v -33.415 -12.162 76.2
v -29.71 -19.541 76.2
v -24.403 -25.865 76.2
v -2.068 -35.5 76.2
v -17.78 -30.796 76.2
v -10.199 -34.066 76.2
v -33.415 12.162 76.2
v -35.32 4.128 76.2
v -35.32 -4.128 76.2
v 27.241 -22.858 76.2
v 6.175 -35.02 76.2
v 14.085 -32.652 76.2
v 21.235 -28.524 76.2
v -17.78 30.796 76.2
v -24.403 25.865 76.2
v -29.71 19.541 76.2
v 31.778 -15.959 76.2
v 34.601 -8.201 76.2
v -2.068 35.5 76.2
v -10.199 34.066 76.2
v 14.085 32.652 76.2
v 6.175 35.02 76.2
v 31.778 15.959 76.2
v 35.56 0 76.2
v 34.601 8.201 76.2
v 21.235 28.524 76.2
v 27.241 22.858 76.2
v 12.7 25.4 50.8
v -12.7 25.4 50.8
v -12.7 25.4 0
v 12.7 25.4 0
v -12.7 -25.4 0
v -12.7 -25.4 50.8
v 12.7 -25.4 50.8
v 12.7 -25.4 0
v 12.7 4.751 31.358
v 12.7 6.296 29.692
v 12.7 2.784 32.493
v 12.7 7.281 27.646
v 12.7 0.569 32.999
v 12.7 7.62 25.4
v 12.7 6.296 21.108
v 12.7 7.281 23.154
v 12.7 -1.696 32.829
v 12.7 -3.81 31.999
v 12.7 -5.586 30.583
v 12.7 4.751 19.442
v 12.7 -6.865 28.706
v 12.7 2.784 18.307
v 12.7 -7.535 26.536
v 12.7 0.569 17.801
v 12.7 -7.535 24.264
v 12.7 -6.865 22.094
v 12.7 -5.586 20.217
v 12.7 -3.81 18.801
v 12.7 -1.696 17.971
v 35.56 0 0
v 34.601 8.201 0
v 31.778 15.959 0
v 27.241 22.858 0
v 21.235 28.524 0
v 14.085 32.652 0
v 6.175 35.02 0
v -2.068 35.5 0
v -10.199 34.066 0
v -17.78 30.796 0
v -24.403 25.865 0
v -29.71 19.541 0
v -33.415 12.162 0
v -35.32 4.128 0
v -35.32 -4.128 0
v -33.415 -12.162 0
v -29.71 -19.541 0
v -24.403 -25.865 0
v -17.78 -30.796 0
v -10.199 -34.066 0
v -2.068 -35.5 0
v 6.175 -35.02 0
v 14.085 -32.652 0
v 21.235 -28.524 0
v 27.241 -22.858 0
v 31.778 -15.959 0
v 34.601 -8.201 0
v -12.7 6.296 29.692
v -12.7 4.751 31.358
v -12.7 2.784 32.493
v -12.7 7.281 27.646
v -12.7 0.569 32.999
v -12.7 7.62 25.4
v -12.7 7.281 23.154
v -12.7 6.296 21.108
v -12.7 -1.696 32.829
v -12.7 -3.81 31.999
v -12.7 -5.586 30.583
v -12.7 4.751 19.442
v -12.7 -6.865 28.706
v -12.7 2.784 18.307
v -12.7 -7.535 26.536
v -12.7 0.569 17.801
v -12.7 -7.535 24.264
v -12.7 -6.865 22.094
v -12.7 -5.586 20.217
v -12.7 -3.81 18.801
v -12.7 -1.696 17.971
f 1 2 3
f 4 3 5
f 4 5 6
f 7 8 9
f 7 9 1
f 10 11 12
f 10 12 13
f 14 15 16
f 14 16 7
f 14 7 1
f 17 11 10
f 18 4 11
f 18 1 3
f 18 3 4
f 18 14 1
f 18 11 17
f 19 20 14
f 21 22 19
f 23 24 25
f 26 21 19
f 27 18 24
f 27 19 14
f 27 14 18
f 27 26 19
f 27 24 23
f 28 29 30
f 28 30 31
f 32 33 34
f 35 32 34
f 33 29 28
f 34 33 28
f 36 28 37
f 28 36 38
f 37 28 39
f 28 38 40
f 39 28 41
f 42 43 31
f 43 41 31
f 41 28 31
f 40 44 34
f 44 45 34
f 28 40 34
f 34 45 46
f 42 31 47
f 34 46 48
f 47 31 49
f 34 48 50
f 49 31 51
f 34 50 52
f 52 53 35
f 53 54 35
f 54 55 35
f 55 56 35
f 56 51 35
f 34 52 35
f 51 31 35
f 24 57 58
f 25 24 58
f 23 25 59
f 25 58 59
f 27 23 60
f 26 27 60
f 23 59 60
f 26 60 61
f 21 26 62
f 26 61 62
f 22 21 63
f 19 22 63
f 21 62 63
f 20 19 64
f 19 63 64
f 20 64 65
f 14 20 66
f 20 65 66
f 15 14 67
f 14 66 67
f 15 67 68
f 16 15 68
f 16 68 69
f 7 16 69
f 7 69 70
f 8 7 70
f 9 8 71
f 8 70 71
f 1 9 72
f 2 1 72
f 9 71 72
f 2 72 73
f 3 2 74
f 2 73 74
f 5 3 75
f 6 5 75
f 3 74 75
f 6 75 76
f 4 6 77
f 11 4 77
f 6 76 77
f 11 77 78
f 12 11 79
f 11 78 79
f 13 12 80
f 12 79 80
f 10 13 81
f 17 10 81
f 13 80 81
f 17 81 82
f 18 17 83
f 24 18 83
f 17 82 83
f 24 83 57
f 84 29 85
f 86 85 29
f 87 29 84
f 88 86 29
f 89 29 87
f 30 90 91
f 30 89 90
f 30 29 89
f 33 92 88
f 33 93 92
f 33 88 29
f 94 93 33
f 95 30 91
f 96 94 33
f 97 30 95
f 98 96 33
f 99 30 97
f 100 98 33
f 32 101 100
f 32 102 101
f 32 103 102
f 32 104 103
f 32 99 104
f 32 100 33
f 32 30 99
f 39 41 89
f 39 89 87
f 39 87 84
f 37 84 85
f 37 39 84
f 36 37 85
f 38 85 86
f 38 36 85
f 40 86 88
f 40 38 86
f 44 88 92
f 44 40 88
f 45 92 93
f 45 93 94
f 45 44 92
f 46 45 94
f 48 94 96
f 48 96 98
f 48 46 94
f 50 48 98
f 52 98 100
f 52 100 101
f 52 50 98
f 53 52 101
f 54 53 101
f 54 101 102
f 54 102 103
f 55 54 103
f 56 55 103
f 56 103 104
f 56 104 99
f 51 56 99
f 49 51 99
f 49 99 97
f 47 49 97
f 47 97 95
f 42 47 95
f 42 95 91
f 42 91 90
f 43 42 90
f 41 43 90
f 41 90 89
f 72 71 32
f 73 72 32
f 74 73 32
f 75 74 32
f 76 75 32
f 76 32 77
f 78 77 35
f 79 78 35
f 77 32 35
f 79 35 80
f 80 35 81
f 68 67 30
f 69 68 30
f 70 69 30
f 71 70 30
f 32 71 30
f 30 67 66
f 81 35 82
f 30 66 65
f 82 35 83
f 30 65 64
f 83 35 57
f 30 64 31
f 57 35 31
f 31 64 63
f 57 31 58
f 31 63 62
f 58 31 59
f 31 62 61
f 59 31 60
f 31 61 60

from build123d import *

# Parameters (mm, degrees)
F0_R     = 35.56
F1_DEPTH = 76.2
F2_W     = 25.4
F2_H     = 50.8
F3_DEPTH = 50.8
F5_R     = 7.62
F6_DEPTH = 66.04


with BuildPart() as f1:
    # F0 (on Top) → F1 (new body)
    with BuildSketch(Plane.XY):
        Circle(F0_R)
    extrude(amount=F1_DEPTH)

    # F2 (on face) → F3 (cut)
    with BuildSketch(Plane(origin=(0, 0, 0), x_dir=(1, 0, 0), z_dir=(0, 0, -1))):
        Rectangle(F2_W, F2_H)
    extrude(amount=-F3_DEPTH, mode=Mode.SUBTRACT)

    # F5 (on offset) → F6 (join)
    with BuildSketch(Plane.YZ.offset(33.02)):
        with Locations((0, 25.4)):
            Circle(F5_R)
    extrude(amount=-F6_DEPTH)


solid = f1.part
